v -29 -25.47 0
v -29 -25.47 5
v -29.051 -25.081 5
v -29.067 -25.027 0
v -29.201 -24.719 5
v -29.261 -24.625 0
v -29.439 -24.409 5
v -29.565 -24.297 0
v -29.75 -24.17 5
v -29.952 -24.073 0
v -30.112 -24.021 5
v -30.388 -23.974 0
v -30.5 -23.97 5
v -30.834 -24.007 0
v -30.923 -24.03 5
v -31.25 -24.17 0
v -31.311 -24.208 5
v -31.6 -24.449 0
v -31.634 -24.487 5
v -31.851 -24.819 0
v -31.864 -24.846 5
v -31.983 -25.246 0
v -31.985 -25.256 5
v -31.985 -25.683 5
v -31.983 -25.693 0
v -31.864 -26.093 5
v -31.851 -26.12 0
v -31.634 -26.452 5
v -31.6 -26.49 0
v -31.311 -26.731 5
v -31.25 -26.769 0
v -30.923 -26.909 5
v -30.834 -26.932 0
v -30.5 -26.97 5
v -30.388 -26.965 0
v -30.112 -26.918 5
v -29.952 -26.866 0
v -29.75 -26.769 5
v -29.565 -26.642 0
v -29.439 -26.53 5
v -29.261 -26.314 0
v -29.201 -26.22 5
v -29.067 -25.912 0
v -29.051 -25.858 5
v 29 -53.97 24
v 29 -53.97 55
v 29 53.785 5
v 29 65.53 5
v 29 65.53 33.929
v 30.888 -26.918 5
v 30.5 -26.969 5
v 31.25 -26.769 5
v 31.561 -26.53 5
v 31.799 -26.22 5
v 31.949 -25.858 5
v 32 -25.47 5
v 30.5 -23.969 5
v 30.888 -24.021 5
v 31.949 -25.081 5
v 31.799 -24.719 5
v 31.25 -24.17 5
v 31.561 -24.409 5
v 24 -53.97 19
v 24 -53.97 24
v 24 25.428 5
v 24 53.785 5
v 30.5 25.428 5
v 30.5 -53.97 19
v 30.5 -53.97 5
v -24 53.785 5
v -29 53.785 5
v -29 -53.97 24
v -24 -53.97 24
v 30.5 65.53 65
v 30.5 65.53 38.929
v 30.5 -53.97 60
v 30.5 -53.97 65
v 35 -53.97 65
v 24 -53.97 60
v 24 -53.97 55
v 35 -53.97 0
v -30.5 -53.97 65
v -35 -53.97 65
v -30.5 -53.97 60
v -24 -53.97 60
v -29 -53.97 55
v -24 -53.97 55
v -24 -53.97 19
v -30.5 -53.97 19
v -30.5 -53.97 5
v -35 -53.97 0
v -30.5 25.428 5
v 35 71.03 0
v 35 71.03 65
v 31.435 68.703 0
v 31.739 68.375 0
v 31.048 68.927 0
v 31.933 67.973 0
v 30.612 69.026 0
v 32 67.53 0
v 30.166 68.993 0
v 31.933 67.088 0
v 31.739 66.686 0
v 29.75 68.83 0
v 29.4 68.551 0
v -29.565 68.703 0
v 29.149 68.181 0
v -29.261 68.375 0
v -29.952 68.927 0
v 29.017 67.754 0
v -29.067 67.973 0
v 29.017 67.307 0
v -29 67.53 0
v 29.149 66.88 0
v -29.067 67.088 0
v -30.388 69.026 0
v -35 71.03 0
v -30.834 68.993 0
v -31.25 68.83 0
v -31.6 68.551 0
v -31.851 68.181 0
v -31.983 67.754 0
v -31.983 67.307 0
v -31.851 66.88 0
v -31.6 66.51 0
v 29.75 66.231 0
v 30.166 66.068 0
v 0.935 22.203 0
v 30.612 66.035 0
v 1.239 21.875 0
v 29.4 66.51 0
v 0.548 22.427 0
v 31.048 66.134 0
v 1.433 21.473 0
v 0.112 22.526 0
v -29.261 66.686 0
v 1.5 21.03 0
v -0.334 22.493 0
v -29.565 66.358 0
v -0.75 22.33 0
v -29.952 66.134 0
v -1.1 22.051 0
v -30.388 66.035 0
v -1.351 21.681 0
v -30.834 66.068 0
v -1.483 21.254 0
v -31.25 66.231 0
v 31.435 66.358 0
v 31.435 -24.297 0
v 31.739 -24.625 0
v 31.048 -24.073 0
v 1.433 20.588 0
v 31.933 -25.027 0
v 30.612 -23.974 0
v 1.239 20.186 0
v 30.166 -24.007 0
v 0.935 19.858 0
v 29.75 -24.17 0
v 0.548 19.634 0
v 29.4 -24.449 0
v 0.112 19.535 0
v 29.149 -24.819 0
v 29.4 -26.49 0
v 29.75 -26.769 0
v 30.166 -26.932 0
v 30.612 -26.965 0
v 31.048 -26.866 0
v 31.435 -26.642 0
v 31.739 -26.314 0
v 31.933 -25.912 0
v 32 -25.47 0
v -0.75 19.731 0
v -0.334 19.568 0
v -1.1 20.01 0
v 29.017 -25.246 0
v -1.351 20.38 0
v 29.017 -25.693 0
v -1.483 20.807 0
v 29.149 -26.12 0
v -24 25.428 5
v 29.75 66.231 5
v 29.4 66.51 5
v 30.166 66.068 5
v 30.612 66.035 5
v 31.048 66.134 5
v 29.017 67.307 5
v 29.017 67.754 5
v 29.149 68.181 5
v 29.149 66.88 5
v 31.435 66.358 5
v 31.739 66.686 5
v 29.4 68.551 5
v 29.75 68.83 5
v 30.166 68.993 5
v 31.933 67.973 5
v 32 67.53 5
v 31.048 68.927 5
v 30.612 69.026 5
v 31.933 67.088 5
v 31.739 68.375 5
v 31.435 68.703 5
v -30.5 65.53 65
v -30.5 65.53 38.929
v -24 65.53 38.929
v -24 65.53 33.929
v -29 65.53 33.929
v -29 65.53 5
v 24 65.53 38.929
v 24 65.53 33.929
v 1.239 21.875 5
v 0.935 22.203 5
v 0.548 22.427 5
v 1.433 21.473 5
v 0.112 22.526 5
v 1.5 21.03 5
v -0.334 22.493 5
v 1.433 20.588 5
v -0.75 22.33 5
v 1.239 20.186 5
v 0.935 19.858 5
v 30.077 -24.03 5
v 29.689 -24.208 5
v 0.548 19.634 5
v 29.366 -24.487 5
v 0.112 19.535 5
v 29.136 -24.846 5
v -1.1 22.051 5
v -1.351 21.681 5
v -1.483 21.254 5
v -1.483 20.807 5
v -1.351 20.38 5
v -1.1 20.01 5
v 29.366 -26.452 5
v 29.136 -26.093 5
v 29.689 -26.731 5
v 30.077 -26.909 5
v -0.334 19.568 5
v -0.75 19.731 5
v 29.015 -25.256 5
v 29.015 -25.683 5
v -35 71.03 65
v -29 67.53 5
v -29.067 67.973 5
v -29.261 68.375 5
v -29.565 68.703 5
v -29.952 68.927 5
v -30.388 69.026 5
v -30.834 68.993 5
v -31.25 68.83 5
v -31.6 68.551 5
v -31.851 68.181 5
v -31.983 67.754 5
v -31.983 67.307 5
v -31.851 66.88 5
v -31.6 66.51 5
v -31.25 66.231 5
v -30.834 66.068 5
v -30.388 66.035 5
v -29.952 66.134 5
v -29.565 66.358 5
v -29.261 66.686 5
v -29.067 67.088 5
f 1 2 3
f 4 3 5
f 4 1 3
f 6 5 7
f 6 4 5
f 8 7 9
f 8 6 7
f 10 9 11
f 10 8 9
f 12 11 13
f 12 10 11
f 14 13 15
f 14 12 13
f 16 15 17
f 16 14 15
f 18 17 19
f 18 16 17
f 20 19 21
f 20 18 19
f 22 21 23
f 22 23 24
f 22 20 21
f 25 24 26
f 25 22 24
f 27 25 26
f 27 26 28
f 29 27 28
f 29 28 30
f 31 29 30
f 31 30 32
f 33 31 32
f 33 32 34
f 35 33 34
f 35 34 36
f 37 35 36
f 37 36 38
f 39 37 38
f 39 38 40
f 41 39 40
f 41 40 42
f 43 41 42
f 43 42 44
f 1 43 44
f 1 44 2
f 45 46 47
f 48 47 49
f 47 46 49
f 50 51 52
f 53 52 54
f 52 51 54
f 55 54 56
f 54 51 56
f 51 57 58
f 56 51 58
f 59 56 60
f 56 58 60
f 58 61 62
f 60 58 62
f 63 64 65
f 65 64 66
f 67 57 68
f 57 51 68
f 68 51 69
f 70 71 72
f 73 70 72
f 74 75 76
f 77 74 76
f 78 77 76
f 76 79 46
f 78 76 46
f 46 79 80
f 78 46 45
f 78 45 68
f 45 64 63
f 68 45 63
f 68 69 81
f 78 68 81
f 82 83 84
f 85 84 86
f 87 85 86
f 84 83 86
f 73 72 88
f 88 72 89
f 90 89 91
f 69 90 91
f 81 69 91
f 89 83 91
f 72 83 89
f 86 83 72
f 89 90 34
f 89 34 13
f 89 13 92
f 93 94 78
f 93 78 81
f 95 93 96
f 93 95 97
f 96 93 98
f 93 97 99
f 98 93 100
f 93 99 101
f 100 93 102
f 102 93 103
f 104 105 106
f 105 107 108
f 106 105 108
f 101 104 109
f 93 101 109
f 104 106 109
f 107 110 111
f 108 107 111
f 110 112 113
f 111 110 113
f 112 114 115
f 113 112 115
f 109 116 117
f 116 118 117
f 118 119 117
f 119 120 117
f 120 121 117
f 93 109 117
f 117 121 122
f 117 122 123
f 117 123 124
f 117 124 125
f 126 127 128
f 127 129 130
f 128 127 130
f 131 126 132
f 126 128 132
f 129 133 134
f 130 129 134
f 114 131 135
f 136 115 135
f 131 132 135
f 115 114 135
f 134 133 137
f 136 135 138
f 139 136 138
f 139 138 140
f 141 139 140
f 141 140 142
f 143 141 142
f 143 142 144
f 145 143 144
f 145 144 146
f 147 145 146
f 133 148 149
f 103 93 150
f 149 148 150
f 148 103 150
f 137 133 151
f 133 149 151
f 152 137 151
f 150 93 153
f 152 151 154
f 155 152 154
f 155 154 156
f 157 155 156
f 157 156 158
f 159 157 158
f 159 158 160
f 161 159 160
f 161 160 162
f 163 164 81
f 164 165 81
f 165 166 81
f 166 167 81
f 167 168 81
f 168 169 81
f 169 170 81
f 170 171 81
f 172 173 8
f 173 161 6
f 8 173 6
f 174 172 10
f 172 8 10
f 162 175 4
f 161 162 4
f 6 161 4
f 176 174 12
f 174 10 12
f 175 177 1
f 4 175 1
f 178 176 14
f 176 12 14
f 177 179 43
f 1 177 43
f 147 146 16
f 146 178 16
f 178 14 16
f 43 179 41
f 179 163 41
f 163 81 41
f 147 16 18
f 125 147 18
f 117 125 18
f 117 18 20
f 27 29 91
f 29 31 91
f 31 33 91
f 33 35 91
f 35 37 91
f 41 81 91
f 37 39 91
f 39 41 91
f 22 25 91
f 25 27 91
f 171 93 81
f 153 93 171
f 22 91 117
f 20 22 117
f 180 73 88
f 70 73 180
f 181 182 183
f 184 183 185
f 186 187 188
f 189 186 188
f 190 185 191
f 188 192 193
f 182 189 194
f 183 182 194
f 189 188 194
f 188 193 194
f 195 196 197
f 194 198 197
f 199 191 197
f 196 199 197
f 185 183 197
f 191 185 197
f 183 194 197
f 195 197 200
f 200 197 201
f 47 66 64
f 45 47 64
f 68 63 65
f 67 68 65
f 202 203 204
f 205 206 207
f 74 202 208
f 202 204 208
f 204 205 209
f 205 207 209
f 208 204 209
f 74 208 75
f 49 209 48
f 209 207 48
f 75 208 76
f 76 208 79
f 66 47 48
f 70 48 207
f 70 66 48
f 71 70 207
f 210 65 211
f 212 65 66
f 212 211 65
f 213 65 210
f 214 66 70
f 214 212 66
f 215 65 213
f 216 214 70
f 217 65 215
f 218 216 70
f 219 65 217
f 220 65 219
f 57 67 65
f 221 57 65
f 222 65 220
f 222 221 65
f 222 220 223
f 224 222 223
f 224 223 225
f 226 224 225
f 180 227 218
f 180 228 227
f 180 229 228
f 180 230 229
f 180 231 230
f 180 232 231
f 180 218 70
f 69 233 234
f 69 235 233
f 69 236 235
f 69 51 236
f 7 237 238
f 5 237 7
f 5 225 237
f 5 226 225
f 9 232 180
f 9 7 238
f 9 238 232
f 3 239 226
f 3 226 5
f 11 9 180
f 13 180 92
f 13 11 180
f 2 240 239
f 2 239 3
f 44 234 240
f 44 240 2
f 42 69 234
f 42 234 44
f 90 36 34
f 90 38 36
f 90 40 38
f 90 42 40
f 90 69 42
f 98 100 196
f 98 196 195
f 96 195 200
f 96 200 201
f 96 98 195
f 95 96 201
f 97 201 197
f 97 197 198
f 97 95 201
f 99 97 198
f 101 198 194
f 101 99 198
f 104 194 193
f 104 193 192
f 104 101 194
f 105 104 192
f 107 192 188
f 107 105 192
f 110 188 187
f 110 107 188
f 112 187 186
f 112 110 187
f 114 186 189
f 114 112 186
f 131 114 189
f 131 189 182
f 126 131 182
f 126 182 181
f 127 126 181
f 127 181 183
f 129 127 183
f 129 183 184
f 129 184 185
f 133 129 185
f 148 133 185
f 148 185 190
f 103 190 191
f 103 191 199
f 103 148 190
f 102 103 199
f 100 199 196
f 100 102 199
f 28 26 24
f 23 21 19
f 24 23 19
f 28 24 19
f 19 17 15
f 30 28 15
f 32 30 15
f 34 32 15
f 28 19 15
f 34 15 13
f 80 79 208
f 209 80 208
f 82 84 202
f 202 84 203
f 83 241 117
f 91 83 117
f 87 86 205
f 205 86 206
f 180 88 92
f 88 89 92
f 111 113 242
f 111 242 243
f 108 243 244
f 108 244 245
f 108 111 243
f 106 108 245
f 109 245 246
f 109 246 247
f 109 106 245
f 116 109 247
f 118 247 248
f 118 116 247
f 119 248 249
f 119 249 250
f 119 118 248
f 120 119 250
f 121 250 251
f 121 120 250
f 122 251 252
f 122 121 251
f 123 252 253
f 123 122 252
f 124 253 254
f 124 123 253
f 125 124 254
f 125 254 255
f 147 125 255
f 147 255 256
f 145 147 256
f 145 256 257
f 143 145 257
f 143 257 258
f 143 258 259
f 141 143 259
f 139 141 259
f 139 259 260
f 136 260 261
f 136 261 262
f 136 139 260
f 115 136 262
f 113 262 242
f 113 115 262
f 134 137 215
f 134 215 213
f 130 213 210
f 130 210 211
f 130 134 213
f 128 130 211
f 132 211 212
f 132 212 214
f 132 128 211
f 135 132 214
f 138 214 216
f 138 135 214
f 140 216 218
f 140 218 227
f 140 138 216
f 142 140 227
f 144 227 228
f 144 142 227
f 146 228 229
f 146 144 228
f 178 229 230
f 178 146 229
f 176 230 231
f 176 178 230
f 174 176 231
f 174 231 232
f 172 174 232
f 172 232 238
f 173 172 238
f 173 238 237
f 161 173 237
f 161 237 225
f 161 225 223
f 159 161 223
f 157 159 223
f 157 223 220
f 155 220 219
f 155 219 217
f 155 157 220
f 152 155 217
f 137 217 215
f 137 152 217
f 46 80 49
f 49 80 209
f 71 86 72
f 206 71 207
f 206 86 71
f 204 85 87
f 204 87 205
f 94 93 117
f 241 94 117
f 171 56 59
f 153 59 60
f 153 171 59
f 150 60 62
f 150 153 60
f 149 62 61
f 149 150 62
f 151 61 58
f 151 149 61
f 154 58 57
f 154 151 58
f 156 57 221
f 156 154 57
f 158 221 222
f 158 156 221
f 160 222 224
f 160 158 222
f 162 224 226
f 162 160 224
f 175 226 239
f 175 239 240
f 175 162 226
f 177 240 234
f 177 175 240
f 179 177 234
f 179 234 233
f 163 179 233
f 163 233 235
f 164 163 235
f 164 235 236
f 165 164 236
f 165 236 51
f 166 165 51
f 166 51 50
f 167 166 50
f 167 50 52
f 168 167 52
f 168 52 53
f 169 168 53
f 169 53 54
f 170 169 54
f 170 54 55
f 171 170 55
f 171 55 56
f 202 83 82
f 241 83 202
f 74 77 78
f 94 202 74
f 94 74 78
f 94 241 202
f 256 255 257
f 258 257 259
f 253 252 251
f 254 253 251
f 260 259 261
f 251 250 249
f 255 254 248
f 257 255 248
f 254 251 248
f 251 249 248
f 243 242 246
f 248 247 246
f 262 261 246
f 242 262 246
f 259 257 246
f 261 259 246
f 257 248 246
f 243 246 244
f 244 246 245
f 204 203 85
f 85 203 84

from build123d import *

# Parameters (mm, degrees)
SKETCH1_W             = 72
SKETCH1_H             = 125
BOSS_EXTRUDE1_DEPTH   = 5
SKETCH2_R             = 1.5
CUT_EXTRUDE6_DEPTH    = 5
BOSS_EXTRUDE2_DEPTH   = 60
BOSS_EXTRUDE3_START   = -30.5
BOSS_EXTRUDE3_DEPTH   = 1.5
BOSS_EXTRUDE3_START_2 = 29
BOSS_EXTRUDE3_2_DEPTH = 1.5
BOSS_EXTRUDE3_START_3 = -29
BOSS_EXTRUDE3_3_DEPTH = 5
BOSS_EXTRUDE3_START_4 = 24
BOSS_EXTRUDE3_4_DEPTH = 5
SKETCH5_W             = 1
SKETCH5_H             = 65
SKETCH5_W_2           = 4
CUT_EXTRUDE7_DEPTH    = 158


# Read off the part's stored shape, not the designer's step: Boss-Extrude3
with BuildPart() as part:
    # Sketch1 → Boss-Extrude1 (new body)
    with BuildSketch(Plane(origin=(0, 0, 0), x_dir=(-1, 0, 0), z_dir=(0, 0, 1))):
        with Locations((0, -8.5305)):
            Rectangle(SKETCH1_W, SKETCH1_H)
    extrude(amount=BOSS_EXTRUDE1_DEPTH)

    # Sketch2 → Cut-Extrude6 (cut)
    with BuildSketch(Plane(origin=(0, 0, 0), x_dir=(-1, 0, 0), z_dir=(0, 0, 1))):
        with Locations(Location((30.5, -67.5305, 0), (0, 0, 180))):
            Circle(SKETCH2_R)
        with Locations(Location((-30.5, -67.5305, 0), (0, 0, 180))):
            Circle(SKETCH2_R)
        with Locations(Location((30.5, 25.4695, 0), (0, 0, 180))):
            Circle(SKETCH2_R)
        with Locations(Location((-30.5, 25.4695, 0), (0, 0, 180))):
            Circle(SKETCH2_R)
        with Locations(Location((0, -21.0305, 0), (0, 0, 180))):
            Circle(SKETCH2_R)
    extrude(amount=CUT_EXTRUDE6_DEPTH, mode=Mode.SUBTRACT)

    # Sketch3 → Boss-Extrude2 (add)
    with BuildSketch(Plane.XY.offset(5)):
        Polygon((-30.5, -53.9695), (-30.5, 65.5305), (30.5, 65.5305), (30.5, -53.9695), (36, -53.9695), (36, 71.0305), (-36, 71.0305), (-36, -53.9695), align=None)
    extrude(amount=BOSS_EXTRUDE2_DEPTH)

    # Boss-Extrude3 outline → Boss-Extrude3 (add)
    with BuildSketch(Plane.YZ.offset(BOSS_EXTRUDE3_START)):
        Polygon((-53.9695, 19), (25.428445475, 5), (65.5305, 5), (65.5305, 38.928925805), (-53.9695, 60), align=None)
    extrude(amount=BOSS_EXTRUDE3_DEPTH)

    # Boss-Extrude3 2 outline → Boss-Extrude3 2 (add)
    with BuildSketch(Plane.YZ.offset(BOSS_EXTRUDE3_START_2)):
        Polygon((-53.9695, 19), (25.428445475, 5), (65.5305, 5), (65.5305, 38.928925805), (-53.9695, 60), align=None)
    extrude(amount=BOSS_EXTRUDE3_2_DEPTH)

    # Boss-Extrude3 3 outline → Boss-Extrude3 3 (add)
    with BuildSketch(Plane.YZ.offset(BOSS_EXTRUDE3_START_3)):
        Polygon((-53.9695, 24), (-53.9695, 19), (25.428445475, 5), (53.784854573, 5), align=None)
        Polygon((-53.9695, 60), (-53.9695, 55), (65.5305, 33.928925805), (65.5305, 38.928925805), align=None)
    extrude(amount=BOSS_EXTRUDE3_3_DEPTH)

    # Boss-Extrude3 4 outline → Boss-Extrude3 4 (add)
    with BuildSketch(Plane.YZ.offset(BOSS_EXTRUDE3_START_4)):
        Polygon((-53.9695, 24), (-53.9695, 19), (25.428445475, 5), (53.784854573, 5), align=None)
        Polygon((-53.9695, 60), (-53.9695, 55), (65.5305, 33.928925805), (65.5305, 38.928925805), align=None)
    extrude(amount=BOSS_EXTRUDE3_4_DEPTH)

    # Sketch5 → Cut-Extrude7 (cut)
    with BuildSketch(Plane(origin=(0, 71.0305, 0), x_dir=(1, 0, 0), z_dir=(0, 1, 0))):
        with Locations((-35.5, -32.5)):
            Rectangle(SKETCH5_W, SKETCH5_H)
        with Locations((-38, -32.5)):
            Rectangle(SKETCH5_W_2, SKETCH5_H)
        with Locations((38, -32.5)):
            Rectangle(SKETCH5_W_2, SKETCH5_H)
        with Locations((35.5, -32.5)):
            Rectangle(SKETCH5_W, SKETCH5_H)
    extrude(amount=-CUT_EXTRUDE7_DEPTH, mode=Mode.SUBTRACT)


solid = part.part
